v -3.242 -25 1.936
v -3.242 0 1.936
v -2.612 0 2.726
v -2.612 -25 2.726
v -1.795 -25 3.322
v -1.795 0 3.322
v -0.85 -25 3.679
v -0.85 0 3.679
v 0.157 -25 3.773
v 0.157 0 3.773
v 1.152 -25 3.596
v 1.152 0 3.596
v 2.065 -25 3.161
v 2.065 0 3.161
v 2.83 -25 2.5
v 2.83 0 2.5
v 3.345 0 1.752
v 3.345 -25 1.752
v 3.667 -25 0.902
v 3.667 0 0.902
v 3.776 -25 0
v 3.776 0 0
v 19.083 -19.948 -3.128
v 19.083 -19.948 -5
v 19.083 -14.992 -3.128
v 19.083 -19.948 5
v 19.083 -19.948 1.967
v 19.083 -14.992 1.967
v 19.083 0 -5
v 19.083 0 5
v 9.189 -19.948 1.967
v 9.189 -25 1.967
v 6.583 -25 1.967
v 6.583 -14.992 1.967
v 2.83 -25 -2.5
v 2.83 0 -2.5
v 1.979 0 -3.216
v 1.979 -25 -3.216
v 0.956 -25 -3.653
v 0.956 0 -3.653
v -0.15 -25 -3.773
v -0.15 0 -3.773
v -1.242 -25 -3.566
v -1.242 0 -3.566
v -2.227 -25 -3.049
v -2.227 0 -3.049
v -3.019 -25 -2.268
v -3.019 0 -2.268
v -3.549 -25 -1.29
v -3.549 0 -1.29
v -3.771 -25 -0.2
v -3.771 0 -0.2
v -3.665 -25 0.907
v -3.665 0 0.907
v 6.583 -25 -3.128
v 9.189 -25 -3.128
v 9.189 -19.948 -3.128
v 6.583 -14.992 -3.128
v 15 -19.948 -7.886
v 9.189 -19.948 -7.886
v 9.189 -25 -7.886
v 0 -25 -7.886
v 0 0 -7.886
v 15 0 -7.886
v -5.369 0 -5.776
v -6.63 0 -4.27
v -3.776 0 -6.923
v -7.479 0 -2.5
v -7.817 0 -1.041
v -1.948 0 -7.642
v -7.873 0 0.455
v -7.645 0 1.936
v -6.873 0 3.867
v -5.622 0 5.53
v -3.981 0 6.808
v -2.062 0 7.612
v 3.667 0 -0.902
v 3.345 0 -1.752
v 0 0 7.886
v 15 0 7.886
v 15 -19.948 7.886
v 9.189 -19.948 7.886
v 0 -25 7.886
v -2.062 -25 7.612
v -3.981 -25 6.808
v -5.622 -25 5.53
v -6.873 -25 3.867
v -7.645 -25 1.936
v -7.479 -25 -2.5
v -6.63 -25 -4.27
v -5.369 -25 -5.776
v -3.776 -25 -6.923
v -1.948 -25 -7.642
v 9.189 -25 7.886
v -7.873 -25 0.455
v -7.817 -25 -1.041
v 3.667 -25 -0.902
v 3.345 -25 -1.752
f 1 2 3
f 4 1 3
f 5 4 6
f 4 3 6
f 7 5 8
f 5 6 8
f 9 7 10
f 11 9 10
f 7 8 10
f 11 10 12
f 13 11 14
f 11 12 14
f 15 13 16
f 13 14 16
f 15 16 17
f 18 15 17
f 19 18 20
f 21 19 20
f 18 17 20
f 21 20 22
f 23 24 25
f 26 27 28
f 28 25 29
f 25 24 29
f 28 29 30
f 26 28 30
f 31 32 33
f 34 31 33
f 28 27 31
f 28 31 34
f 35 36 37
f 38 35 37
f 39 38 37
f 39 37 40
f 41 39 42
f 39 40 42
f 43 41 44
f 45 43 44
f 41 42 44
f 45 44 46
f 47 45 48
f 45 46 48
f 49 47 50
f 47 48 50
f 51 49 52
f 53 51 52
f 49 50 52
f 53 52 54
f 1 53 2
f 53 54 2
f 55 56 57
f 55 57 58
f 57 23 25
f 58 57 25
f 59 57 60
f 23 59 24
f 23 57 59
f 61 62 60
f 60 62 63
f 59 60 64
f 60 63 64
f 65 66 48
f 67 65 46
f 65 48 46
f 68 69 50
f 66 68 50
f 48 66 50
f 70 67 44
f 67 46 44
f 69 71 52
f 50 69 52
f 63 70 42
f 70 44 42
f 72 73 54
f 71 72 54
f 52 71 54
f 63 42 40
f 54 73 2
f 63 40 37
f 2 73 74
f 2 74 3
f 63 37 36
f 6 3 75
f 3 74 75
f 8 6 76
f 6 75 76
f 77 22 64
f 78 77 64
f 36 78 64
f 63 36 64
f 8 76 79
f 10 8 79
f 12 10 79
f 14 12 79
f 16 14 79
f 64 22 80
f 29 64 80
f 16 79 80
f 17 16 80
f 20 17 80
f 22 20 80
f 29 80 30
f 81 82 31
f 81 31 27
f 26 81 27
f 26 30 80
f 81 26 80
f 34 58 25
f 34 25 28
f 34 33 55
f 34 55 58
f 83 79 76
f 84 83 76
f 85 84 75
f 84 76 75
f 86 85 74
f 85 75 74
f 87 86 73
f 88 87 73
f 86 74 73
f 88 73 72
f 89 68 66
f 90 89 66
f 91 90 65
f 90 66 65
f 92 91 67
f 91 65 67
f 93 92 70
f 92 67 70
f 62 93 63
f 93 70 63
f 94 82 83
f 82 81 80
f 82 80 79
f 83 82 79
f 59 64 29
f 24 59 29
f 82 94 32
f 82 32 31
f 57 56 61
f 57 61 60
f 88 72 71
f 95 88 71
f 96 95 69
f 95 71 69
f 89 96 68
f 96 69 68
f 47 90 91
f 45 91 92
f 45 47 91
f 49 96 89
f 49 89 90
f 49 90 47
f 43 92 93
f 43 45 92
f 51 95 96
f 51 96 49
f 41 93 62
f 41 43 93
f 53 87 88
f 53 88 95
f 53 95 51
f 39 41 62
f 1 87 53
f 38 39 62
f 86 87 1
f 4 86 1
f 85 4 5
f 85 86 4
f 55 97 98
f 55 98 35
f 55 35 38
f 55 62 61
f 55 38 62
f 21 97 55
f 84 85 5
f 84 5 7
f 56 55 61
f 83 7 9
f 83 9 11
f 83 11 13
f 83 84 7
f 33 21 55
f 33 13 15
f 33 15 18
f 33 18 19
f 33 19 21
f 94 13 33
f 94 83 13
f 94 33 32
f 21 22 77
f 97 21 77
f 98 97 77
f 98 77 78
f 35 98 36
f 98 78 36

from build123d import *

# Parameters (mm, degrees)
F1_DEPTH = 25
F2_W     = 9.942237
F2_H     = 5.052494
F3_DEPTH = 15.773309
F4_W     = 10.188986
F4_H     = 5.094493
F5_DEPTH = 12.5


with BuildPart() as f1:
    # F0 (on Front) → F1 (new body)
    with BuildSketch(Plane.XZ):
        with BuildLine():
            Line((2.829923, 2.5), (7.479401, 2.5))
            ThreePointArc((7.479401, 2.5), (4.608473, 6.399485), (0, 7.886155))
            ThreePointArc((0, 7.886155), (-4.843936, 6.22316), (-7.64494, 1.935543))
            Line((-7.64494, 1.935543), (-3.242242, 1.935543))
            ThreePointArc((-3.242242, 1.935543), (-0.349506, 3.759828), (2.829923, 2.5))
        make_face()
        with BuildLine():
            Line((19.082905, 2.5), (7.479401, 2.5))
            Line((7.479401, 2.5), (2.829923, 2.5))
            ThreePointArc((2.829923, 2.5), (3.531597, 1.336519), (3.776038, 0))
            ThreePointArc((3.776038, 0), (3.531597, -1.336519), (2.829923, -2.5))
            Line((2.829923, -2.5), (7.479401, -2.5))
            Line((7.479401, -2.5), (19.082905, -2.5))
            Line((19.082905, -2.5), (19.082905, 2.5))
        make_face()
        with BuildLine():
            ThreePointArc((0, 7.886155), (4.608473, 6.399485), (7.479401, 2.5))
            Line((7.479401, 2.5), (19.082905, 2.5))
            Line((19.082905, 2.5), (19.082905, 5))
            Line((19.082905, 5), (15, 7.886155))
            Line((15, 7.886155), (0, 7.886155))
        make_face()
        with BuildLine():
            Line((-3.242242, 1.935543), (-7.64494, 1.935543))
            ThreePointArc((-7.64494, 1.935543), (-7.880668, -0.294115), (-7.479401, -2.5))
            ThreePointArc((-7.479401, -2.5), (-4.608473, -6.399485), (0, -7.886155))
            ThreePointArc((0, -7.886155), (4.608473, -6.399485), (7.479401, -2.5))
            Line((7.479401, -2.5), (2.829923, -2.5))
            ThreePointArc((2.829923, -2.5), (-2.227333, -3.049172), (-3.242242, 1.935543))
        make_face()
        with BuildLine():
            Line((19.082905, -5), (19.082905, -2.5))
            Line((19.082905, -2.5), (7.479401, -2.5))
            ThreePointArc((7.479401, -2.5), (4.608473, -6.399485), (0, -7.886155))
            Line((0, -7.886155), (15, -7.886155))
            Line((15, -7.886155), (19.082905, -5))
        make_face()
    extrude(amount=F1_DEPTH)

    # F2 (on face) → F3 (cut, through all)
    with BuildSketch(Plane.XY.offset(7.886155)):
        with Locations((14.159961, -22.473753)):
            Rectangle(F2_W, F2_H)
    extrude(amount=-F3_DEPTH, mode=Mode.SUBTRACT)

    # F4 (on face) → F5 (cut, symmetric)
    with BuildSketch(Plane.YZ.offset(19.082905)):
        with Locations((-20.086851, -0.580305)):
            Rectangle(F4_W, F4_H)
    extrude(amount=F5_DEPTH, both=True, mode=Mode.SUBTRACT)


solid = f1.part
